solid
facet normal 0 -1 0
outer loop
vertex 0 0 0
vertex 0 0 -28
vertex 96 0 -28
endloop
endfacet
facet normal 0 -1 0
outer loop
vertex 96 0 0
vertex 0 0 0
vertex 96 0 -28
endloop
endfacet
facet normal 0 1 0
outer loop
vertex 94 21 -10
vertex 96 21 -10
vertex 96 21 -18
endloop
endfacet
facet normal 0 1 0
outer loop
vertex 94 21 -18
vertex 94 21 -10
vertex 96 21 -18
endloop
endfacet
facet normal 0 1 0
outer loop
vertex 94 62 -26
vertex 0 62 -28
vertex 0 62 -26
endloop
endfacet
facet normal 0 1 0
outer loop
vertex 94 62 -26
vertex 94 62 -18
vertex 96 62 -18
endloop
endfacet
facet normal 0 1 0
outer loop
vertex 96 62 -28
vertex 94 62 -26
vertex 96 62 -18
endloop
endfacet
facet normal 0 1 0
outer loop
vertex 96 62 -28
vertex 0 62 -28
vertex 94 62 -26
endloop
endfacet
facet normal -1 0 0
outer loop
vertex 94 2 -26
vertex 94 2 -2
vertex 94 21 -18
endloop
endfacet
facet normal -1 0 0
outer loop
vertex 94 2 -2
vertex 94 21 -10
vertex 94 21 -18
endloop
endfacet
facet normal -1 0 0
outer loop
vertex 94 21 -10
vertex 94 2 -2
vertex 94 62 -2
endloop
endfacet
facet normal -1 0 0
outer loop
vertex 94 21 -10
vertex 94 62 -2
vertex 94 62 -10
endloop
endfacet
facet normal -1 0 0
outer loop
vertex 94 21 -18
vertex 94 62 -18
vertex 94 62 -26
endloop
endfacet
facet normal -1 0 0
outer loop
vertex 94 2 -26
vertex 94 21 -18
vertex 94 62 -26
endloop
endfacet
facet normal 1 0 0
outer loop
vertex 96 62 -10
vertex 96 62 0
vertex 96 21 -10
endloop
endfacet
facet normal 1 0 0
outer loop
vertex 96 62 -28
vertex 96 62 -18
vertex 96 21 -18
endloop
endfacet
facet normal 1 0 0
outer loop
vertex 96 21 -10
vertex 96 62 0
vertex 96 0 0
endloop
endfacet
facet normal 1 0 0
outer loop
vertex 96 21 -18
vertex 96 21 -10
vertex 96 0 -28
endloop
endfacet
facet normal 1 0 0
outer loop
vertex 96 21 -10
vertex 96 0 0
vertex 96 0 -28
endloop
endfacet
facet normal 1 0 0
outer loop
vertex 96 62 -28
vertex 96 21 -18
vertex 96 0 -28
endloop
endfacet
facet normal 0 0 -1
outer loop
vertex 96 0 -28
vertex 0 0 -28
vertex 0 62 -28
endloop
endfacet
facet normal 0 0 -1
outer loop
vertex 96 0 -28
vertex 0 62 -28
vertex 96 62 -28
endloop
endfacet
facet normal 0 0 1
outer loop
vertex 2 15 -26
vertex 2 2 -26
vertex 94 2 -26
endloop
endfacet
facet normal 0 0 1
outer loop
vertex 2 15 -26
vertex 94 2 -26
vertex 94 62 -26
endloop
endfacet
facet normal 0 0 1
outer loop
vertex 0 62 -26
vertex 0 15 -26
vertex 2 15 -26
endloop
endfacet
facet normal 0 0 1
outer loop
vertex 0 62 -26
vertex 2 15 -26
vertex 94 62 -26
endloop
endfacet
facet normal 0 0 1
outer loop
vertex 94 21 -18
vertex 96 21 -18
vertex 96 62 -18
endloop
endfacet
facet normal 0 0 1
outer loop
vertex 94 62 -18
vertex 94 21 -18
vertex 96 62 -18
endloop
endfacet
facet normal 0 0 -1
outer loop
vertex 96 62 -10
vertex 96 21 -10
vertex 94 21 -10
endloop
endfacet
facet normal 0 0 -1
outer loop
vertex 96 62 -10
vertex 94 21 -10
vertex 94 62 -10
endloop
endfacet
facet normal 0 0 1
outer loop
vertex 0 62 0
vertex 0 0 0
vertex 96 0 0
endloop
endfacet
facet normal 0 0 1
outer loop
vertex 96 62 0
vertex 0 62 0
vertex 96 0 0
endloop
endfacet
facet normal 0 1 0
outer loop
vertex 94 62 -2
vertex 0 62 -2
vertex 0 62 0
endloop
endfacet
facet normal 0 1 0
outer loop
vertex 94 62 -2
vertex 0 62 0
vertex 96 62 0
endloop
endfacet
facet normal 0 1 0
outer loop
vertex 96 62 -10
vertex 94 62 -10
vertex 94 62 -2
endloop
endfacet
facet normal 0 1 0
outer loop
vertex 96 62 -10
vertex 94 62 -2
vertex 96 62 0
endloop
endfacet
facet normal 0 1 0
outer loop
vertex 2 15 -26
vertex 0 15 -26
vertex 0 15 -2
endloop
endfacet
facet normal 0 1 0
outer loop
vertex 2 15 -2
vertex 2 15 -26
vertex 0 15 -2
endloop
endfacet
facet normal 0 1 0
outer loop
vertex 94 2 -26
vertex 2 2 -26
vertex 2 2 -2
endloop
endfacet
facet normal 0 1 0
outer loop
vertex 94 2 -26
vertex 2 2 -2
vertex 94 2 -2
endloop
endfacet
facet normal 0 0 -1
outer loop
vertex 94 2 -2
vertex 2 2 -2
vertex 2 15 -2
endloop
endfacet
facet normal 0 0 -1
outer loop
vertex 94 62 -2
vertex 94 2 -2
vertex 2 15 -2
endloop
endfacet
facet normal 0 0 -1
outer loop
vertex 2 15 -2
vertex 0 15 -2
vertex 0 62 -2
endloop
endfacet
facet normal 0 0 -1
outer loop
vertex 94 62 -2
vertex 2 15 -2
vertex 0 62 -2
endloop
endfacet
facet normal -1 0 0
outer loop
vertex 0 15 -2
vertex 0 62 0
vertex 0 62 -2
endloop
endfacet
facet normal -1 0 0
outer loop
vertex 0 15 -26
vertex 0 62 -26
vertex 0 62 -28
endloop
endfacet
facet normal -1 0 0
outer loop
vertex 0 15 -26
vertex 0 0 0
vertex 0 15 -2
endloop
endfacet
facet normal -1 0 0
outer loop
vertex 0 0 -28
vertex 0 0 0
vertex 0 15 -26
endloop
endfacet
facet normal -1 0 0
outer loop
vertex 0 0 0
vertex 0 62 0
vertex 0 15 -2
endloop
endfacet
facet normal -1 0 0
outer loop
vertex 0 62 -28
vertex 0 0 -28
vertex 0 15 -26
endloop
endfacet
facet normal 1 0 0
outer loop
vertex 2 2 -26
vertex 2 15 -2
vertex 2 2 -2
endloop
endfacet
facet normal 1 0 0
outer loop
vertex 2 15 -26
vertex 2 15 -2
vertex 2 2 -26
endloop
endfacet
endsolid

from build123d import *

# Parameters (mm, degrees)
SKETCH1_W           = 96
SKETCH1_H           = 28
BOSS_EXTRUDE1_DEPTH = 62
SKETCH2_W           = 92
SKETCH2_H           = 24
CUT_EXTRUDE1_DEPTH  = 60
SKETCH3_W           = 8
SKETCH3_H           = 41
CUT_EXTRUDE2_DEPTH  = 12
SKETCH4_W           = 24
SKETCH4_H           = 47
CUT_EXTRUDE3_DEPTH  = 10


with BuildPart() as part:
    # Sketch1 → Boss-Extrude1 (new body)
    with BuildSketch(Plane(origin=(0, 0, 0), x_dir=(1, 0, 0), z_dir=(0, 1, 0))):
        with Locations((48, 14)):
            Rectangle(SKETCH1_W, SKETCH1_H)
    extrude(amount=BOSS_EXTRUDE1_DEPTH)

    # Sketch2 → Cut-Extrude1 (cut)
    with BuildSketch(Plane(origin=(0, 62, 0), x_dir=(1, 0, 0), z_dir=(0, 1, 0))):
        with Locations((48, 14)):
            Rectangle(SKETCH2_W, SKETCH2_H)
    extrude(amount=-CUT_EXTRUDE1_DEPTH, mode=Mode.SUBTRACT)

    # Sketch3 → Cut-Extrude2 (cut)
    with BuildSketch(Plane(origin=(96, 0, 0), x_dir=(0, 0, -1), z_dir=(1, 0, 0))):
        with Locations((14, 41.5)):
            Rectangle(SKETCH3_W, SKETCH3_H)
    extrude(amount=-CUT_EXTRUDE2_DEPTH, mode=Mode.SUBTRACT)

    # Sketch4 → Cut-Extrude3 (cut)
    with BuildSketch(Plane.ZY):
        with Locations((-14, 38.5)):
            Rectangle(SKETCH4_W, SKETCH4_H)
    extrude(amount=-CUT_EXTRUDE3_DEPTH, mode=Mode.SUBTRACT)


solid = part.part
